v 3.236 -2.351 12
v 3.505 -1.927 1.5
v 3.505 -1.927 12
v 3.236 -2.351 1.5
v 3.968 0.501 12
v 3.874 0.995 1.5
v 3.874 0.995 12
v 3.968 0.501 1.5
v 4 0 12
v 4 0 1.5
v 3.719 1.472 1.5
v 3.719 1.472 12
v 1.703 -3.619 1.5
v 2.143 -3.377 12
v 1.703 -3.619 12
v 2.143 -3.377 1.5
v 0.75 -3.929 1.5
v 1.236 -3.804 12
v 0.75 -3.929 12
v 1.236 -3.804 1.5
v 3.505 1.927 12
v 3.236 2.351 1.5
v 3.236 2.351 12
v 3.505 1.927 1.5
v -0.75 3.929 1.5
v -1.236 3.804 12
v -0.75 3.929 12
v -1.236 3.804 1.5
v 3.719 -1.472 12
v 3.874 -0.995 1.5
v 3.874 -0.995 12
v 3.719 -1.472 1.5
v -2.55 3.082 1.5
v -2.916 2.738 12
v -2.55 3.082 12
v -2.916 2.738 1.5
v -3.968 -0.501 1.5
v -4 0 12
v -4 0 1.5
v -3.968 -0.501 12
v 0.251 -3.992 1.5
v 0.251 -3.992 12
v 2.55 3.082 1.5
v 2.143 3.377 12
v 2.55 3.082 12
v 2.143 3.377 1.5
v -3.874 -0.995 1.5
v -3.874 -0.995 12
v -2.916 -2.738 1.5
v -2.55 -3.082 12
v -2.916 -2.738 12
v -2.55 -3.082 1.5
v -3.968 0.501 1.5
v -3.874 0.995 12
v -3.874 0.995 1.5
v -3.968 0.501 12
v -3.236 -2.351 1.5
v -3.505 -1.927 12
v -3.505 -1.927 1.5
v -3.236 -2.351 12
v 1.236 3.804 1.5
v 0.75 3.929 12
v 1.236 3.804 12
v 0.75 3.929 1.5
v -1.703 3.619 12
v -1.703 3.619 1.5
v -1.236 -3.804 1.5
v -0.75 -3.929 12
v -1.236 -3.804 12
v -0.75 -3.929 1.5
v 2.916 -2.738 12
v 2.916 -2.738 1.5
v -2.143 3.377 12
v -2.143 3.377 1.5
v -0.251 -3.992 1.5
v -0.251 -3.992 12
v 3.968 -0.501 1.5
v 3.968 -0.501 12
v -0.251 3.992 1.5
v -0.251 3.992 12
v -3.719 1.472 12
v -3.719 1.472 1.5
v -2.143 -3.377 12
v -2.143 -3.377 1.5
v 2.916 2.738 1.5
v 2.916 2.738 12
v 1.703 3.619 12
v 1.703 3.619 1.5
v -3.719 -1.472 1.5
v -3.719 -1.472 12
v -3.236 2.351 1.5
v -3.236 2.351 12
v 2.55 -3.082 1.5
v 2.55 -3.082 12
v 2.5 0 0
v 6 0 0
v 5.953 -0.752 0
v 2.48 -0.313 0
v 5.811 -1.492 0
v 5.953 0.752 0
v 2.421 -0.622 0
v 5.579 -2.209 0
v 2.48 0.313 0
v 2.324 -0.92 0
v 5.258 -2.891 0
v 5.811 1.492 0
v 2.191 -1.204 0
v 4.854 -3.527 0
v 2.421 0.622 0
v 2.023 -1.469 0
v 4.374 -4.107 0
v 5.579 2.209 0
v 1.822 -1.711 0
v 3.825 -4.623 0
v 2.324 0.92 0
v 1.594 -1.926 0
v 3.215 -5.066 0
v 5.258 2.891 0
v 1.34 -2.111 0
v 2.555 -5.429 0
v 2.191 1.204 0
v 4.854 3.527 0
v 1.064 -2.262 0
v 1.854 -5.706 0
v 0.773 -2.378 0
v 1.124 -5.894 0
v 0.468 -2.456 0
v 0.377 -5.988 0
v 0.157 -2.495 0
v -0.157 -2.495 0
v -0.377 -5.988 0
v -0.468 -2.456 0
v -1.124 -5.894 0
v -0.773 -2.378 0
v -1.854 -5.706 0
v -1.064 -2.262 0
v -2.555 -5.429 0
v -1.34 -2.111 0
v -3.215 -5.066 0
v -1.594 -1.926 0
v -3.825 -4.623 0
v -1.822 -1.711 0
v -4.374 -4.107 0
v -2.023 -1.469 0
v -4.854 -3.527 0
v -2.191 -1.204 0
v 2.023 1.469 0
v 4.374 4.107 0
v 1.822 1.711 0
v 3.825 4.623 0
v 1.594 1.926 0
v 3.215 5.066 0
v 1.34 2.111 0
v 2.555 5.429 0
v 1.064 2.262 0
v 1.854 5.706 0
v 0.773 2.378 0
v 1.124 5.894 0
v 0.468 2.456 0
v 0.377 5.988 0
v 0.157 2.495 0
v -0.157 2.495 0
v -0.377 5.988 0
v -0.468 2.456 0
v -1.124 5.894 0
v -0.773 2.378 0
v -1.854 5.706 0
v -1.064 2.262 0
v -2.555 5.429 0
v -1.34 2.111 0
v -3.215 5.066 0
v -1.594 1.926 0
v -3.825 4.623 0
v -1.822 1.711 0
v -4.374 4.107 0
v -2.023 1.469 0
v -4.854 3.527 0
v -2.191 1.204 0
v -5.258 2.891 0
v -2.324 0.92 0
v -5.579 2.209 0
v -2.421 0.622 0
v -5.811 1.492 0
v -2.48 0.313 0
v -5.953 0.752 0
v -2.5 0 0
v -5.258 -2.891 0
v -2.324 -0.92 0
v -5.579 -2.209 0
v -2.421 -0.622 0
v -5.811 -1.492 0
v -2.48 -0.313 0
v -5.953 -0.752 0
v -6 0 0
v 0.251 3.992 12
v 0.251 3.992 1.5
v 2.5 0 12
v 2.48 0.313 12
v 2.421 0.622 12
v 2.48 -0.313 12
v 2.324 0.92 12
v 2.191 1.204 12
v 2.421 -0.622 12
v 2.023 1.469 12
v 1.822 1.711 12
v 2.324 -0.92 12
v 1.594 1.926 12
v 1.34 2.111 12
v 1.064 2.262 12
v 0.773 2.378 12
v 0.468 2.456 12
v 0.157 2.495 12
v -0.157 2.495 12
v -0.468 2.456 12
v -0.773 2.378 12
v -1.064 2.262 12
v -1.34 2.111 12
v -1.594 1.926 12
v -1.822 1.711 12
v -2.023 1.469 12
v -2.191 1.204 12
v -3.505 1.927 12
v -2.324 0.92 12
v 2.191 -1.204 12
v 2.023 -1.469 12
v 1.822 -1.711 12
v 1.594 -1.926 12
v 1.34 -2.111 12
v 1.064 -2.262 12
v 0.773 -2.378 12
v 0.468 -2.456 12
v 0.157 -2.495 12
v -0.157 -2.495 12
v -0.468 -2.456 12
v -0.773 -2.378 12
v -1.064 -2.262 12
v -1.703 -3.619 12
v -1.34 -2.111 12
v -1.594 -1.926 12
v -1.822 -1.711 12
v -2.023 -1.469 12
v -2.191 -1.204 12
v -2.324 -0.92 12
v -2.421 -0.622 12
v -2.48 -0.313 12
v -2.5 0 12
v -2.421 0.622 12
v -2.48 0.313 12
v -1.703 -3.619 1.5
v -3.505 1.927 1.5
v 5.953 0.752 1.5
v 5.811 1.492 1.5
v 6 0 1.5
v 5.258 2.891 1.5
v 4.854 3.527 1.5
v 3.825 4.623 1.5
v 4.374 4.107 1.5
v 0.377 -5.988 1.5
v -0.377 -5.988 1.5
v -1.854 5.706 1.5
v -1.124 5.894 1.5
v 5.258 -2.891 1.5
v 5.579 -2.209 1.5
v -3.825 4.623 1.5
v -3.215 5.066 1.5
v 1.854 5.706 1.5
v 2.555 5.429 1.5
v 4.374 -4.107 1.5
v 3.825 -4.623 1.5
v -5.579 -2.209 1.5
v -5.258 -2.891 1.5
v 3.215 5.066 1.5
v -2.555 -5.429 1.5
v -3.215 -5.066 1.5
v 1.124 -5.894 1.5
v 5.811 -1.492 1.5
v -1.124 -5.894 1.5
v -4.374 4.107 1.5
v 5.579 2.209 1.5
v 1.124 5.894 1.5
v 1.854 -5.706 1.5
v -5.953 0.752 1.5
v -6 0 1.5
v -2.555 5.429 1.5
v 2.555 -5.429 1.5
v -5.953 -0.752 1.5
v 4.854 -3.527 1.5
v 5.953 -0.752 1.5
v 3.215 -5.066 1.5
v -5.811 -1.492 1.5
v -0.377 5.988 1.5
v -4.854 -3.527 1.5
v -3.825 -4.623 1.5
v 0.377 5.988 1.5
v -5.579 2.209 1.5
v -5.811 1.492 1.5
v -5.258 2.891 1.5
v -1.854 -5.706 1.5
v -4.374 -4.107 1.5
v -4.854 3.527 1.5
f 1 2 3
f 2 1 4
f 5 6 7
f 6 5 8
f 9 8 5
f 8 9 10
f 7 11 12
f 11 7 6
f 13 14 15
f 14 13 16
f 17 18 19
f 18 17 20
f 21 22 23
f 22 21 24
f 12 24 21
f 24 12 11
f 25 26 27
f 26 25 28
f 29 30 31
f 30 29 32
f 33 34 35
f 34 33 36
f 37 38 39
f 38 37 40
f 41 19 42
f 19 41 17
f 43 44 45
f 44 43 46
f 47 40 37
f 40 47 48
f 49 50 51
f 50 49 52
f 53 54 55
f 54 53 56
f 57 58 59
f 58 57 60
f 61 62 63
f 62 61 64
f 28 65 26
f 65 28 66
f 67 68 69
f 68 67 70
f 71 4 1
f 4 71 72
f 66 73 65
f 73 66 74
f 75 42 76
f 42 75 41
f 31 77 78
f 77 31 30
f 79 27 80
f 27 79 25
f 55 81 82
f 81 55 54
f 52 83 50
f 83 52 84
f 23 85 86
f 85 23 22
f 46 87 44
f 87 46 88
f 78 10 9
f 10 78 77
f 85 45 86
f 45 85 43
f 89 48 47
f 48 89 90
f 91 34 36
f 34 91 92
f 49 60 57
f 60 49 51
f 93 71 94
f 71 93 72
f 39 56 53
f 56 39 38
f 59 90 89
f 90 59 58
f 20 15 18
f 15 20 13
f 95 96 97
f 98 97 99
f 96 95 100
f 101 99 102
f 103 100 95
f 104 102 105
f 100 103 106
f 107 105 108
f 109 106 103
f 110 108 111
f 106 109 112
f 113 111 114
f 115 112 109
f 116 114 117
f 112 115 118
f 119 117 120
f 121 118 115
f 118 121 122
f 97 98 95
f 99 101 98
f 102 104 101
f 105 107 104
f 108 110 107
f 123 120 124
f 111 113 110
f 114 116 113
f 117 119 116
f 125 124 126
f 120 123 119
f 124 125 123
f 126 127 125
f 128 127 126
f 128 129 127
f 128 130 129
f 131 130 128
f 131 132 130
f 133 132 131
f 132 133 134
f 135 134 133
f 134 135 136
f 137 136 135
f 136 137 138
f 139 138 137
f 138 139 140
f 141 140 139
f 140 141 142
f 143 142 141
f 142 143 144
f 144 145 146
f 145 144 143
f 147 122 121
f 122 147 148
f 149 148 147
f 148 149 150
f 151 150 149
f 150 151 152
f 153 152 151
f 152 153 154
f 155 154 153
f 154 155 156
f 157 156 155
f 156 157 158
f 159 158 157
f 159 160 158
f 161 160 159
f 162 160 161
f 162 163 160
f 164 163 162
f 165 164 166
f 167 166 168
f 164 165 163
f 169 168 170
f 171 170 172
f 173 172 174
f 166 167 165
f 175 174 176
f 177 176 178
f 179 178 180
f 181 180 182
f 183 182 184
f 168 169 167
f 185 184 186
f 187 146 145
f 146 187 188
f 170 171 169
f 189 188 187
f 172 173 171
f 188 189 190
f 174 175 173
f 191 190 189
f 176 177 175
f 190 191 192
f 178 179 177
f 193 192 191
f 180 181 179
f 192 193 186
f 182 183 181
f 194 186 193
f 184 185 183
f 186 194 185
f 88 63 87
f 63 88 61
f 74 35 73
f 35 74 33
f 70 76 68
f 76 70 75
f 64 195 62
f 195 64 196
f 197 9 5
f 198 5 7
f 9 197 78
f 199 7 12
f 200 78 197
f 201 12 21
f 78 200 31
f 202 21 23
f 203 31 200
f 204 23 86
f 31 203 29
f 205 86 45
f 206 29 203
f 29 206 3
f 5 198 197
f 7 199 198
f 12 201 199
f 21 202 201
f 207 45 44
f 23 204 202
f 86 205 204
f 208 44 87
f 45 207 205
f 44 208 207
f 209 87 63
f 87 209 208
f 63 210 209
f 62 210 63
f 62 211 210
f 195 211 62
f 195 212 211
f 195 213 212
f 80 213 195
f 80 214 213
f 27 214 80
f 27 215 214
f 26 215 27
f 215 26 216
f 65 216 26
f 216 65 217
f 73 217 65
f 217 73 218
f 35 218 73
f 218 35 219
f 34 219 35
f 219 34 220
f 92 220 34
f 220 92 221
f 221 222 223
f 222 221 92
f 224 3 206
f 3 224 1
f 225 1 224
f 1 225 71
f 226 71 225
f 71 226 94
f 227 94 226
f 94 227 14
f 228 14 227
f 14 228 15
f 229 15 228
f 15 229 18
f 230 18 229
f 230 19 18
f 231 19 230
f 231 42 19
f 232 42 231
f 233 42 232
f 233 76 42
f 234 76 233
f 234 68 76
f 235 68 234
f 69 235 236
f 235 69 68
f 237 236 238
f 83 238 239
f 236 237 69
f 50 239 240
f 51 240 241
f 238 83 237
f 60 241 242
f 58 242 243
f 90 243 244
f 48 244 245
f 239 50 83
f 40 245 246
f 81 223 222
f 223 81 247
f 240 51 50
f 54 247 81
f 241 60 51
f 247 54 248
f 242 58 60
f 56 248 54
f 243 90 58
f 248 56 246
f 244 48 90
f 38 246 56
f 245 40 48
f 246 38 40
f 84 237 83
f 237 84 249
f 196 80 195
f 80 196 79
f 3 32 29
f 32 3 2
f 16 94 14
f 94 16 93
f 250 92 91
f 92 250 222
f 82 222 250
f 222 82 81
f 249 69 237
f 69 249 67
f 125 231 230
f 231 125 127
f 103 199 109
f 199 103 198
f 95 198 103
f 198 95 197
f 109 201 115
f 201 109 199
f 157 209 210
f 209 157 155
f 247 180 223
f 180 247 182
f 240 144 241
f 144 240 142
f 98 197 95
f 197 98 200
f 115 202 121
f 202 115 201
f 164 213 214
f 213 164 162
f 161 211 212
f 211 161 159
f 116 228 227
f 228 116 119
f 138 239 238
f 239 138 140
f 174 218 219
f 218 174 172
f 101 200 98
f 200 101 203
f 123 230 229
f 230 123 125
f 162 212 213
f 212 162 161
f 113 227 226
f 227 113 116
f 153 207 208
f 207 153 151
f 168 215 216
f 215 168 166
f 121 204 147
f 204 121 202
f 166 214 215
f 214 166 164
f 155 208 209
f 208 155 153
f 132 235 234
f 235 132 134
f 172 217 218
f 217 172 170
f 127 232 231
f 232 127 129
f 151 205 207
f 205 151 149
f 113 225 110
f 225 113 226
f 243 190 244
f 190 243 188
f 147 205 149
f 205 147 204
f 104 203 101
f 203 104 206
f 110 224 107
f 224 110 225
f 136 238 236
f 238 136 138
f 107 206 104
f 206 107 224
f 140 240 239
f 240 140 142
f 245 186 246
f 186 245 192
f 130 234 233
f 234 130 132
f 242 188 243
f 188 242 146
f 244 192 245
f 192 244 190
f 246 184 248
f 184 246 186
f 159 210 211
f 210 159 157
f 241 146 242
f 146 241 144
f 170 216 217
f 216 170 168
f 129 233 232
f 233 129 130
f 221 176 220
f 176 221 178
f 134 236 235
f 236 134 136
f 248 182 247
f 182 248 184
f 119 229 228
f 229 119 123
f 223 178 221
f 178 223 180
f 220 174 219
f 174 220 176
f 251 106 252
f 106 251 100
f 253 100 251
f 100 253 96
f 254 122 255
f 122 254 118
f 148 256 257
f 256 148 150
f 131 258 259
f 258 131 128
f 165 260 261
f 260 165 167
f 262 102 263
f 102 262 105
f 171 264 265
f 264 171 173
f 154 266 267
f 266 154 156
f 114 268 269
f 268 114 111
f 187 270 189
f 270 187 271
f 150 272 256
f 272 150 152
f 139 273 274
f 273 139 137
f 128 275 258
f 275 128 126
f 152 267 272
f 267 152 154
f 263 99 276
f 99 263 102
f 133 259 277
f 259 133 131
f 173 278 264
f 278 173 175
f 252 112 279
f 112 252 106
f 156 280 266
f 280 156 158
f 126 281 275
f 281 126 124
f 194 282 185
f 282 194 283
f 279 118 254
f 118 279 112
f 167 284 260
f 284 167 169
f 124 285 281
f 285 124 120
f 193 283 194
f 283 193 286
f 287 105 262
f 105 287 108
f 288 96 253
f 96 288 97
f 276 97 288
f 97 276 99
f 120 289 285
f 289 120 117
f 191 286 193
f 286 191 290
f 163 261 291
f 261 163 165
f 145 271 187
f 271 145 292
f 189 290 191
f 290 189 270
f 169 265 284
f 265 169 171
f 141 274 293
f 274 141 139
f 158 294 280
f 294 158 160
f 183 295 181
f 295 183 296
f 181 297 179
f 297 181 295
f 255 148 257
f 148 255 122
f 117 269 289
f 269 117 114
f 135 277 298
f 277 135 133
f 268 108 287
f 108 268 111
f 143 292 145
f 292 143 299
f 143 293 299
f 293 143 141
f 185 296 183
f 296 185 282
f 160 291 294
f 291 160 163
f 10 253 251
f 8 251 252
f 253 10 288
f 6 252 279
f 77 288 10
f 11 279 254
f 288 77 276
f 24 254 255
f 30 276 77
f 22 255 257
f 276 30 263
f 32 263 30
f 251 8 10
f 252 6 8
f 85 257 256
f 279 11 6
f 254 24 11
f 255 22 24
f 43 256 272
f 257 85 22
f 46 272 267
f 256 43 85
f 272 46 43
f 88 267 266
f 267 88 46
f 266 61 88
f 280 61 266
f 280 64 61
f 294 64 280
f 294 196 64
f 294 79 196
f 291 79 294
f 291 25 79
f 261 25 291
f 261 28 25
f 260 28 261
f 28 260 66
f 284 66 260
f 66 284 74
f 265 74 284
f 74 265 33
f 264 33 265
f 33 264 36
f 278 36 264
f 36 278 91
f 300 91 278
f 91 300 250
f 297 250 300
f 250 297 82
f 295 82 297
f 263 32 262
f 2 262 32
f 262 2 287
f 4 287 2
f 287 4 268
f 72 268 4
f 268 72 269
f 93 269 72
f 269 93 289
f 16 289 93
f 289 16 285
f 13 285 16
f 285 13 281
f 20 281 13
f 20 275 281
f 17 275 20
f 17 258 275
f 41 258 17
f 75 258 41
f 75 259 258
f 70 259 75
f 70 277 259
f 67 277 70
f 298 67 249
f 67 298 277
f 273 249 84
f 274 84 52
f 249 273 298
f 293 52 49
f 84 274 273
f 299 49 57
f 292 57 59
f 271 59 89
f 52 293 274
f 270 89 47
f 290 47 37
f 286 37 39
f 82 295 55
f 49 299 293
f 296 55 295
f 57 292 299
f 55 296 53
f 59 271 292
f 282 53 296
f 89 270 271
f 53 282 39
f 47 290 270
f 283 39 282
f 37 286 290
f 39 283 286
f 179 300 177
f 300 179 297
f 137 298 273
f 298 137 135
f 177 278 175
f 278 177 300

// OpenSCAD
// CSG file generated from FreeCAD Export 0.1d

// variable description
spacer_height = 12; // possible values
spacer_diameter = 8; // 
inner_diameter = 5; //
rim_diameter = 12; //
rim_height = 1.5;

// Cylinder
difference() {
	// Outer Cylinder
	cylinder(h = spacer_height, d= spacer_diameter, $fn=50);
	// Inner Cylinder
	cylinder(h = spacer_height, d= inner_diameter, $fn=50);
}

// RIM
difference() {
	cylinder(h = rim_height, d= rim_diameter, $fn=50);
	// Inner Cylinder
	cylinder(h = spacer_height, d= inner_diameter, $fn=50);
}

